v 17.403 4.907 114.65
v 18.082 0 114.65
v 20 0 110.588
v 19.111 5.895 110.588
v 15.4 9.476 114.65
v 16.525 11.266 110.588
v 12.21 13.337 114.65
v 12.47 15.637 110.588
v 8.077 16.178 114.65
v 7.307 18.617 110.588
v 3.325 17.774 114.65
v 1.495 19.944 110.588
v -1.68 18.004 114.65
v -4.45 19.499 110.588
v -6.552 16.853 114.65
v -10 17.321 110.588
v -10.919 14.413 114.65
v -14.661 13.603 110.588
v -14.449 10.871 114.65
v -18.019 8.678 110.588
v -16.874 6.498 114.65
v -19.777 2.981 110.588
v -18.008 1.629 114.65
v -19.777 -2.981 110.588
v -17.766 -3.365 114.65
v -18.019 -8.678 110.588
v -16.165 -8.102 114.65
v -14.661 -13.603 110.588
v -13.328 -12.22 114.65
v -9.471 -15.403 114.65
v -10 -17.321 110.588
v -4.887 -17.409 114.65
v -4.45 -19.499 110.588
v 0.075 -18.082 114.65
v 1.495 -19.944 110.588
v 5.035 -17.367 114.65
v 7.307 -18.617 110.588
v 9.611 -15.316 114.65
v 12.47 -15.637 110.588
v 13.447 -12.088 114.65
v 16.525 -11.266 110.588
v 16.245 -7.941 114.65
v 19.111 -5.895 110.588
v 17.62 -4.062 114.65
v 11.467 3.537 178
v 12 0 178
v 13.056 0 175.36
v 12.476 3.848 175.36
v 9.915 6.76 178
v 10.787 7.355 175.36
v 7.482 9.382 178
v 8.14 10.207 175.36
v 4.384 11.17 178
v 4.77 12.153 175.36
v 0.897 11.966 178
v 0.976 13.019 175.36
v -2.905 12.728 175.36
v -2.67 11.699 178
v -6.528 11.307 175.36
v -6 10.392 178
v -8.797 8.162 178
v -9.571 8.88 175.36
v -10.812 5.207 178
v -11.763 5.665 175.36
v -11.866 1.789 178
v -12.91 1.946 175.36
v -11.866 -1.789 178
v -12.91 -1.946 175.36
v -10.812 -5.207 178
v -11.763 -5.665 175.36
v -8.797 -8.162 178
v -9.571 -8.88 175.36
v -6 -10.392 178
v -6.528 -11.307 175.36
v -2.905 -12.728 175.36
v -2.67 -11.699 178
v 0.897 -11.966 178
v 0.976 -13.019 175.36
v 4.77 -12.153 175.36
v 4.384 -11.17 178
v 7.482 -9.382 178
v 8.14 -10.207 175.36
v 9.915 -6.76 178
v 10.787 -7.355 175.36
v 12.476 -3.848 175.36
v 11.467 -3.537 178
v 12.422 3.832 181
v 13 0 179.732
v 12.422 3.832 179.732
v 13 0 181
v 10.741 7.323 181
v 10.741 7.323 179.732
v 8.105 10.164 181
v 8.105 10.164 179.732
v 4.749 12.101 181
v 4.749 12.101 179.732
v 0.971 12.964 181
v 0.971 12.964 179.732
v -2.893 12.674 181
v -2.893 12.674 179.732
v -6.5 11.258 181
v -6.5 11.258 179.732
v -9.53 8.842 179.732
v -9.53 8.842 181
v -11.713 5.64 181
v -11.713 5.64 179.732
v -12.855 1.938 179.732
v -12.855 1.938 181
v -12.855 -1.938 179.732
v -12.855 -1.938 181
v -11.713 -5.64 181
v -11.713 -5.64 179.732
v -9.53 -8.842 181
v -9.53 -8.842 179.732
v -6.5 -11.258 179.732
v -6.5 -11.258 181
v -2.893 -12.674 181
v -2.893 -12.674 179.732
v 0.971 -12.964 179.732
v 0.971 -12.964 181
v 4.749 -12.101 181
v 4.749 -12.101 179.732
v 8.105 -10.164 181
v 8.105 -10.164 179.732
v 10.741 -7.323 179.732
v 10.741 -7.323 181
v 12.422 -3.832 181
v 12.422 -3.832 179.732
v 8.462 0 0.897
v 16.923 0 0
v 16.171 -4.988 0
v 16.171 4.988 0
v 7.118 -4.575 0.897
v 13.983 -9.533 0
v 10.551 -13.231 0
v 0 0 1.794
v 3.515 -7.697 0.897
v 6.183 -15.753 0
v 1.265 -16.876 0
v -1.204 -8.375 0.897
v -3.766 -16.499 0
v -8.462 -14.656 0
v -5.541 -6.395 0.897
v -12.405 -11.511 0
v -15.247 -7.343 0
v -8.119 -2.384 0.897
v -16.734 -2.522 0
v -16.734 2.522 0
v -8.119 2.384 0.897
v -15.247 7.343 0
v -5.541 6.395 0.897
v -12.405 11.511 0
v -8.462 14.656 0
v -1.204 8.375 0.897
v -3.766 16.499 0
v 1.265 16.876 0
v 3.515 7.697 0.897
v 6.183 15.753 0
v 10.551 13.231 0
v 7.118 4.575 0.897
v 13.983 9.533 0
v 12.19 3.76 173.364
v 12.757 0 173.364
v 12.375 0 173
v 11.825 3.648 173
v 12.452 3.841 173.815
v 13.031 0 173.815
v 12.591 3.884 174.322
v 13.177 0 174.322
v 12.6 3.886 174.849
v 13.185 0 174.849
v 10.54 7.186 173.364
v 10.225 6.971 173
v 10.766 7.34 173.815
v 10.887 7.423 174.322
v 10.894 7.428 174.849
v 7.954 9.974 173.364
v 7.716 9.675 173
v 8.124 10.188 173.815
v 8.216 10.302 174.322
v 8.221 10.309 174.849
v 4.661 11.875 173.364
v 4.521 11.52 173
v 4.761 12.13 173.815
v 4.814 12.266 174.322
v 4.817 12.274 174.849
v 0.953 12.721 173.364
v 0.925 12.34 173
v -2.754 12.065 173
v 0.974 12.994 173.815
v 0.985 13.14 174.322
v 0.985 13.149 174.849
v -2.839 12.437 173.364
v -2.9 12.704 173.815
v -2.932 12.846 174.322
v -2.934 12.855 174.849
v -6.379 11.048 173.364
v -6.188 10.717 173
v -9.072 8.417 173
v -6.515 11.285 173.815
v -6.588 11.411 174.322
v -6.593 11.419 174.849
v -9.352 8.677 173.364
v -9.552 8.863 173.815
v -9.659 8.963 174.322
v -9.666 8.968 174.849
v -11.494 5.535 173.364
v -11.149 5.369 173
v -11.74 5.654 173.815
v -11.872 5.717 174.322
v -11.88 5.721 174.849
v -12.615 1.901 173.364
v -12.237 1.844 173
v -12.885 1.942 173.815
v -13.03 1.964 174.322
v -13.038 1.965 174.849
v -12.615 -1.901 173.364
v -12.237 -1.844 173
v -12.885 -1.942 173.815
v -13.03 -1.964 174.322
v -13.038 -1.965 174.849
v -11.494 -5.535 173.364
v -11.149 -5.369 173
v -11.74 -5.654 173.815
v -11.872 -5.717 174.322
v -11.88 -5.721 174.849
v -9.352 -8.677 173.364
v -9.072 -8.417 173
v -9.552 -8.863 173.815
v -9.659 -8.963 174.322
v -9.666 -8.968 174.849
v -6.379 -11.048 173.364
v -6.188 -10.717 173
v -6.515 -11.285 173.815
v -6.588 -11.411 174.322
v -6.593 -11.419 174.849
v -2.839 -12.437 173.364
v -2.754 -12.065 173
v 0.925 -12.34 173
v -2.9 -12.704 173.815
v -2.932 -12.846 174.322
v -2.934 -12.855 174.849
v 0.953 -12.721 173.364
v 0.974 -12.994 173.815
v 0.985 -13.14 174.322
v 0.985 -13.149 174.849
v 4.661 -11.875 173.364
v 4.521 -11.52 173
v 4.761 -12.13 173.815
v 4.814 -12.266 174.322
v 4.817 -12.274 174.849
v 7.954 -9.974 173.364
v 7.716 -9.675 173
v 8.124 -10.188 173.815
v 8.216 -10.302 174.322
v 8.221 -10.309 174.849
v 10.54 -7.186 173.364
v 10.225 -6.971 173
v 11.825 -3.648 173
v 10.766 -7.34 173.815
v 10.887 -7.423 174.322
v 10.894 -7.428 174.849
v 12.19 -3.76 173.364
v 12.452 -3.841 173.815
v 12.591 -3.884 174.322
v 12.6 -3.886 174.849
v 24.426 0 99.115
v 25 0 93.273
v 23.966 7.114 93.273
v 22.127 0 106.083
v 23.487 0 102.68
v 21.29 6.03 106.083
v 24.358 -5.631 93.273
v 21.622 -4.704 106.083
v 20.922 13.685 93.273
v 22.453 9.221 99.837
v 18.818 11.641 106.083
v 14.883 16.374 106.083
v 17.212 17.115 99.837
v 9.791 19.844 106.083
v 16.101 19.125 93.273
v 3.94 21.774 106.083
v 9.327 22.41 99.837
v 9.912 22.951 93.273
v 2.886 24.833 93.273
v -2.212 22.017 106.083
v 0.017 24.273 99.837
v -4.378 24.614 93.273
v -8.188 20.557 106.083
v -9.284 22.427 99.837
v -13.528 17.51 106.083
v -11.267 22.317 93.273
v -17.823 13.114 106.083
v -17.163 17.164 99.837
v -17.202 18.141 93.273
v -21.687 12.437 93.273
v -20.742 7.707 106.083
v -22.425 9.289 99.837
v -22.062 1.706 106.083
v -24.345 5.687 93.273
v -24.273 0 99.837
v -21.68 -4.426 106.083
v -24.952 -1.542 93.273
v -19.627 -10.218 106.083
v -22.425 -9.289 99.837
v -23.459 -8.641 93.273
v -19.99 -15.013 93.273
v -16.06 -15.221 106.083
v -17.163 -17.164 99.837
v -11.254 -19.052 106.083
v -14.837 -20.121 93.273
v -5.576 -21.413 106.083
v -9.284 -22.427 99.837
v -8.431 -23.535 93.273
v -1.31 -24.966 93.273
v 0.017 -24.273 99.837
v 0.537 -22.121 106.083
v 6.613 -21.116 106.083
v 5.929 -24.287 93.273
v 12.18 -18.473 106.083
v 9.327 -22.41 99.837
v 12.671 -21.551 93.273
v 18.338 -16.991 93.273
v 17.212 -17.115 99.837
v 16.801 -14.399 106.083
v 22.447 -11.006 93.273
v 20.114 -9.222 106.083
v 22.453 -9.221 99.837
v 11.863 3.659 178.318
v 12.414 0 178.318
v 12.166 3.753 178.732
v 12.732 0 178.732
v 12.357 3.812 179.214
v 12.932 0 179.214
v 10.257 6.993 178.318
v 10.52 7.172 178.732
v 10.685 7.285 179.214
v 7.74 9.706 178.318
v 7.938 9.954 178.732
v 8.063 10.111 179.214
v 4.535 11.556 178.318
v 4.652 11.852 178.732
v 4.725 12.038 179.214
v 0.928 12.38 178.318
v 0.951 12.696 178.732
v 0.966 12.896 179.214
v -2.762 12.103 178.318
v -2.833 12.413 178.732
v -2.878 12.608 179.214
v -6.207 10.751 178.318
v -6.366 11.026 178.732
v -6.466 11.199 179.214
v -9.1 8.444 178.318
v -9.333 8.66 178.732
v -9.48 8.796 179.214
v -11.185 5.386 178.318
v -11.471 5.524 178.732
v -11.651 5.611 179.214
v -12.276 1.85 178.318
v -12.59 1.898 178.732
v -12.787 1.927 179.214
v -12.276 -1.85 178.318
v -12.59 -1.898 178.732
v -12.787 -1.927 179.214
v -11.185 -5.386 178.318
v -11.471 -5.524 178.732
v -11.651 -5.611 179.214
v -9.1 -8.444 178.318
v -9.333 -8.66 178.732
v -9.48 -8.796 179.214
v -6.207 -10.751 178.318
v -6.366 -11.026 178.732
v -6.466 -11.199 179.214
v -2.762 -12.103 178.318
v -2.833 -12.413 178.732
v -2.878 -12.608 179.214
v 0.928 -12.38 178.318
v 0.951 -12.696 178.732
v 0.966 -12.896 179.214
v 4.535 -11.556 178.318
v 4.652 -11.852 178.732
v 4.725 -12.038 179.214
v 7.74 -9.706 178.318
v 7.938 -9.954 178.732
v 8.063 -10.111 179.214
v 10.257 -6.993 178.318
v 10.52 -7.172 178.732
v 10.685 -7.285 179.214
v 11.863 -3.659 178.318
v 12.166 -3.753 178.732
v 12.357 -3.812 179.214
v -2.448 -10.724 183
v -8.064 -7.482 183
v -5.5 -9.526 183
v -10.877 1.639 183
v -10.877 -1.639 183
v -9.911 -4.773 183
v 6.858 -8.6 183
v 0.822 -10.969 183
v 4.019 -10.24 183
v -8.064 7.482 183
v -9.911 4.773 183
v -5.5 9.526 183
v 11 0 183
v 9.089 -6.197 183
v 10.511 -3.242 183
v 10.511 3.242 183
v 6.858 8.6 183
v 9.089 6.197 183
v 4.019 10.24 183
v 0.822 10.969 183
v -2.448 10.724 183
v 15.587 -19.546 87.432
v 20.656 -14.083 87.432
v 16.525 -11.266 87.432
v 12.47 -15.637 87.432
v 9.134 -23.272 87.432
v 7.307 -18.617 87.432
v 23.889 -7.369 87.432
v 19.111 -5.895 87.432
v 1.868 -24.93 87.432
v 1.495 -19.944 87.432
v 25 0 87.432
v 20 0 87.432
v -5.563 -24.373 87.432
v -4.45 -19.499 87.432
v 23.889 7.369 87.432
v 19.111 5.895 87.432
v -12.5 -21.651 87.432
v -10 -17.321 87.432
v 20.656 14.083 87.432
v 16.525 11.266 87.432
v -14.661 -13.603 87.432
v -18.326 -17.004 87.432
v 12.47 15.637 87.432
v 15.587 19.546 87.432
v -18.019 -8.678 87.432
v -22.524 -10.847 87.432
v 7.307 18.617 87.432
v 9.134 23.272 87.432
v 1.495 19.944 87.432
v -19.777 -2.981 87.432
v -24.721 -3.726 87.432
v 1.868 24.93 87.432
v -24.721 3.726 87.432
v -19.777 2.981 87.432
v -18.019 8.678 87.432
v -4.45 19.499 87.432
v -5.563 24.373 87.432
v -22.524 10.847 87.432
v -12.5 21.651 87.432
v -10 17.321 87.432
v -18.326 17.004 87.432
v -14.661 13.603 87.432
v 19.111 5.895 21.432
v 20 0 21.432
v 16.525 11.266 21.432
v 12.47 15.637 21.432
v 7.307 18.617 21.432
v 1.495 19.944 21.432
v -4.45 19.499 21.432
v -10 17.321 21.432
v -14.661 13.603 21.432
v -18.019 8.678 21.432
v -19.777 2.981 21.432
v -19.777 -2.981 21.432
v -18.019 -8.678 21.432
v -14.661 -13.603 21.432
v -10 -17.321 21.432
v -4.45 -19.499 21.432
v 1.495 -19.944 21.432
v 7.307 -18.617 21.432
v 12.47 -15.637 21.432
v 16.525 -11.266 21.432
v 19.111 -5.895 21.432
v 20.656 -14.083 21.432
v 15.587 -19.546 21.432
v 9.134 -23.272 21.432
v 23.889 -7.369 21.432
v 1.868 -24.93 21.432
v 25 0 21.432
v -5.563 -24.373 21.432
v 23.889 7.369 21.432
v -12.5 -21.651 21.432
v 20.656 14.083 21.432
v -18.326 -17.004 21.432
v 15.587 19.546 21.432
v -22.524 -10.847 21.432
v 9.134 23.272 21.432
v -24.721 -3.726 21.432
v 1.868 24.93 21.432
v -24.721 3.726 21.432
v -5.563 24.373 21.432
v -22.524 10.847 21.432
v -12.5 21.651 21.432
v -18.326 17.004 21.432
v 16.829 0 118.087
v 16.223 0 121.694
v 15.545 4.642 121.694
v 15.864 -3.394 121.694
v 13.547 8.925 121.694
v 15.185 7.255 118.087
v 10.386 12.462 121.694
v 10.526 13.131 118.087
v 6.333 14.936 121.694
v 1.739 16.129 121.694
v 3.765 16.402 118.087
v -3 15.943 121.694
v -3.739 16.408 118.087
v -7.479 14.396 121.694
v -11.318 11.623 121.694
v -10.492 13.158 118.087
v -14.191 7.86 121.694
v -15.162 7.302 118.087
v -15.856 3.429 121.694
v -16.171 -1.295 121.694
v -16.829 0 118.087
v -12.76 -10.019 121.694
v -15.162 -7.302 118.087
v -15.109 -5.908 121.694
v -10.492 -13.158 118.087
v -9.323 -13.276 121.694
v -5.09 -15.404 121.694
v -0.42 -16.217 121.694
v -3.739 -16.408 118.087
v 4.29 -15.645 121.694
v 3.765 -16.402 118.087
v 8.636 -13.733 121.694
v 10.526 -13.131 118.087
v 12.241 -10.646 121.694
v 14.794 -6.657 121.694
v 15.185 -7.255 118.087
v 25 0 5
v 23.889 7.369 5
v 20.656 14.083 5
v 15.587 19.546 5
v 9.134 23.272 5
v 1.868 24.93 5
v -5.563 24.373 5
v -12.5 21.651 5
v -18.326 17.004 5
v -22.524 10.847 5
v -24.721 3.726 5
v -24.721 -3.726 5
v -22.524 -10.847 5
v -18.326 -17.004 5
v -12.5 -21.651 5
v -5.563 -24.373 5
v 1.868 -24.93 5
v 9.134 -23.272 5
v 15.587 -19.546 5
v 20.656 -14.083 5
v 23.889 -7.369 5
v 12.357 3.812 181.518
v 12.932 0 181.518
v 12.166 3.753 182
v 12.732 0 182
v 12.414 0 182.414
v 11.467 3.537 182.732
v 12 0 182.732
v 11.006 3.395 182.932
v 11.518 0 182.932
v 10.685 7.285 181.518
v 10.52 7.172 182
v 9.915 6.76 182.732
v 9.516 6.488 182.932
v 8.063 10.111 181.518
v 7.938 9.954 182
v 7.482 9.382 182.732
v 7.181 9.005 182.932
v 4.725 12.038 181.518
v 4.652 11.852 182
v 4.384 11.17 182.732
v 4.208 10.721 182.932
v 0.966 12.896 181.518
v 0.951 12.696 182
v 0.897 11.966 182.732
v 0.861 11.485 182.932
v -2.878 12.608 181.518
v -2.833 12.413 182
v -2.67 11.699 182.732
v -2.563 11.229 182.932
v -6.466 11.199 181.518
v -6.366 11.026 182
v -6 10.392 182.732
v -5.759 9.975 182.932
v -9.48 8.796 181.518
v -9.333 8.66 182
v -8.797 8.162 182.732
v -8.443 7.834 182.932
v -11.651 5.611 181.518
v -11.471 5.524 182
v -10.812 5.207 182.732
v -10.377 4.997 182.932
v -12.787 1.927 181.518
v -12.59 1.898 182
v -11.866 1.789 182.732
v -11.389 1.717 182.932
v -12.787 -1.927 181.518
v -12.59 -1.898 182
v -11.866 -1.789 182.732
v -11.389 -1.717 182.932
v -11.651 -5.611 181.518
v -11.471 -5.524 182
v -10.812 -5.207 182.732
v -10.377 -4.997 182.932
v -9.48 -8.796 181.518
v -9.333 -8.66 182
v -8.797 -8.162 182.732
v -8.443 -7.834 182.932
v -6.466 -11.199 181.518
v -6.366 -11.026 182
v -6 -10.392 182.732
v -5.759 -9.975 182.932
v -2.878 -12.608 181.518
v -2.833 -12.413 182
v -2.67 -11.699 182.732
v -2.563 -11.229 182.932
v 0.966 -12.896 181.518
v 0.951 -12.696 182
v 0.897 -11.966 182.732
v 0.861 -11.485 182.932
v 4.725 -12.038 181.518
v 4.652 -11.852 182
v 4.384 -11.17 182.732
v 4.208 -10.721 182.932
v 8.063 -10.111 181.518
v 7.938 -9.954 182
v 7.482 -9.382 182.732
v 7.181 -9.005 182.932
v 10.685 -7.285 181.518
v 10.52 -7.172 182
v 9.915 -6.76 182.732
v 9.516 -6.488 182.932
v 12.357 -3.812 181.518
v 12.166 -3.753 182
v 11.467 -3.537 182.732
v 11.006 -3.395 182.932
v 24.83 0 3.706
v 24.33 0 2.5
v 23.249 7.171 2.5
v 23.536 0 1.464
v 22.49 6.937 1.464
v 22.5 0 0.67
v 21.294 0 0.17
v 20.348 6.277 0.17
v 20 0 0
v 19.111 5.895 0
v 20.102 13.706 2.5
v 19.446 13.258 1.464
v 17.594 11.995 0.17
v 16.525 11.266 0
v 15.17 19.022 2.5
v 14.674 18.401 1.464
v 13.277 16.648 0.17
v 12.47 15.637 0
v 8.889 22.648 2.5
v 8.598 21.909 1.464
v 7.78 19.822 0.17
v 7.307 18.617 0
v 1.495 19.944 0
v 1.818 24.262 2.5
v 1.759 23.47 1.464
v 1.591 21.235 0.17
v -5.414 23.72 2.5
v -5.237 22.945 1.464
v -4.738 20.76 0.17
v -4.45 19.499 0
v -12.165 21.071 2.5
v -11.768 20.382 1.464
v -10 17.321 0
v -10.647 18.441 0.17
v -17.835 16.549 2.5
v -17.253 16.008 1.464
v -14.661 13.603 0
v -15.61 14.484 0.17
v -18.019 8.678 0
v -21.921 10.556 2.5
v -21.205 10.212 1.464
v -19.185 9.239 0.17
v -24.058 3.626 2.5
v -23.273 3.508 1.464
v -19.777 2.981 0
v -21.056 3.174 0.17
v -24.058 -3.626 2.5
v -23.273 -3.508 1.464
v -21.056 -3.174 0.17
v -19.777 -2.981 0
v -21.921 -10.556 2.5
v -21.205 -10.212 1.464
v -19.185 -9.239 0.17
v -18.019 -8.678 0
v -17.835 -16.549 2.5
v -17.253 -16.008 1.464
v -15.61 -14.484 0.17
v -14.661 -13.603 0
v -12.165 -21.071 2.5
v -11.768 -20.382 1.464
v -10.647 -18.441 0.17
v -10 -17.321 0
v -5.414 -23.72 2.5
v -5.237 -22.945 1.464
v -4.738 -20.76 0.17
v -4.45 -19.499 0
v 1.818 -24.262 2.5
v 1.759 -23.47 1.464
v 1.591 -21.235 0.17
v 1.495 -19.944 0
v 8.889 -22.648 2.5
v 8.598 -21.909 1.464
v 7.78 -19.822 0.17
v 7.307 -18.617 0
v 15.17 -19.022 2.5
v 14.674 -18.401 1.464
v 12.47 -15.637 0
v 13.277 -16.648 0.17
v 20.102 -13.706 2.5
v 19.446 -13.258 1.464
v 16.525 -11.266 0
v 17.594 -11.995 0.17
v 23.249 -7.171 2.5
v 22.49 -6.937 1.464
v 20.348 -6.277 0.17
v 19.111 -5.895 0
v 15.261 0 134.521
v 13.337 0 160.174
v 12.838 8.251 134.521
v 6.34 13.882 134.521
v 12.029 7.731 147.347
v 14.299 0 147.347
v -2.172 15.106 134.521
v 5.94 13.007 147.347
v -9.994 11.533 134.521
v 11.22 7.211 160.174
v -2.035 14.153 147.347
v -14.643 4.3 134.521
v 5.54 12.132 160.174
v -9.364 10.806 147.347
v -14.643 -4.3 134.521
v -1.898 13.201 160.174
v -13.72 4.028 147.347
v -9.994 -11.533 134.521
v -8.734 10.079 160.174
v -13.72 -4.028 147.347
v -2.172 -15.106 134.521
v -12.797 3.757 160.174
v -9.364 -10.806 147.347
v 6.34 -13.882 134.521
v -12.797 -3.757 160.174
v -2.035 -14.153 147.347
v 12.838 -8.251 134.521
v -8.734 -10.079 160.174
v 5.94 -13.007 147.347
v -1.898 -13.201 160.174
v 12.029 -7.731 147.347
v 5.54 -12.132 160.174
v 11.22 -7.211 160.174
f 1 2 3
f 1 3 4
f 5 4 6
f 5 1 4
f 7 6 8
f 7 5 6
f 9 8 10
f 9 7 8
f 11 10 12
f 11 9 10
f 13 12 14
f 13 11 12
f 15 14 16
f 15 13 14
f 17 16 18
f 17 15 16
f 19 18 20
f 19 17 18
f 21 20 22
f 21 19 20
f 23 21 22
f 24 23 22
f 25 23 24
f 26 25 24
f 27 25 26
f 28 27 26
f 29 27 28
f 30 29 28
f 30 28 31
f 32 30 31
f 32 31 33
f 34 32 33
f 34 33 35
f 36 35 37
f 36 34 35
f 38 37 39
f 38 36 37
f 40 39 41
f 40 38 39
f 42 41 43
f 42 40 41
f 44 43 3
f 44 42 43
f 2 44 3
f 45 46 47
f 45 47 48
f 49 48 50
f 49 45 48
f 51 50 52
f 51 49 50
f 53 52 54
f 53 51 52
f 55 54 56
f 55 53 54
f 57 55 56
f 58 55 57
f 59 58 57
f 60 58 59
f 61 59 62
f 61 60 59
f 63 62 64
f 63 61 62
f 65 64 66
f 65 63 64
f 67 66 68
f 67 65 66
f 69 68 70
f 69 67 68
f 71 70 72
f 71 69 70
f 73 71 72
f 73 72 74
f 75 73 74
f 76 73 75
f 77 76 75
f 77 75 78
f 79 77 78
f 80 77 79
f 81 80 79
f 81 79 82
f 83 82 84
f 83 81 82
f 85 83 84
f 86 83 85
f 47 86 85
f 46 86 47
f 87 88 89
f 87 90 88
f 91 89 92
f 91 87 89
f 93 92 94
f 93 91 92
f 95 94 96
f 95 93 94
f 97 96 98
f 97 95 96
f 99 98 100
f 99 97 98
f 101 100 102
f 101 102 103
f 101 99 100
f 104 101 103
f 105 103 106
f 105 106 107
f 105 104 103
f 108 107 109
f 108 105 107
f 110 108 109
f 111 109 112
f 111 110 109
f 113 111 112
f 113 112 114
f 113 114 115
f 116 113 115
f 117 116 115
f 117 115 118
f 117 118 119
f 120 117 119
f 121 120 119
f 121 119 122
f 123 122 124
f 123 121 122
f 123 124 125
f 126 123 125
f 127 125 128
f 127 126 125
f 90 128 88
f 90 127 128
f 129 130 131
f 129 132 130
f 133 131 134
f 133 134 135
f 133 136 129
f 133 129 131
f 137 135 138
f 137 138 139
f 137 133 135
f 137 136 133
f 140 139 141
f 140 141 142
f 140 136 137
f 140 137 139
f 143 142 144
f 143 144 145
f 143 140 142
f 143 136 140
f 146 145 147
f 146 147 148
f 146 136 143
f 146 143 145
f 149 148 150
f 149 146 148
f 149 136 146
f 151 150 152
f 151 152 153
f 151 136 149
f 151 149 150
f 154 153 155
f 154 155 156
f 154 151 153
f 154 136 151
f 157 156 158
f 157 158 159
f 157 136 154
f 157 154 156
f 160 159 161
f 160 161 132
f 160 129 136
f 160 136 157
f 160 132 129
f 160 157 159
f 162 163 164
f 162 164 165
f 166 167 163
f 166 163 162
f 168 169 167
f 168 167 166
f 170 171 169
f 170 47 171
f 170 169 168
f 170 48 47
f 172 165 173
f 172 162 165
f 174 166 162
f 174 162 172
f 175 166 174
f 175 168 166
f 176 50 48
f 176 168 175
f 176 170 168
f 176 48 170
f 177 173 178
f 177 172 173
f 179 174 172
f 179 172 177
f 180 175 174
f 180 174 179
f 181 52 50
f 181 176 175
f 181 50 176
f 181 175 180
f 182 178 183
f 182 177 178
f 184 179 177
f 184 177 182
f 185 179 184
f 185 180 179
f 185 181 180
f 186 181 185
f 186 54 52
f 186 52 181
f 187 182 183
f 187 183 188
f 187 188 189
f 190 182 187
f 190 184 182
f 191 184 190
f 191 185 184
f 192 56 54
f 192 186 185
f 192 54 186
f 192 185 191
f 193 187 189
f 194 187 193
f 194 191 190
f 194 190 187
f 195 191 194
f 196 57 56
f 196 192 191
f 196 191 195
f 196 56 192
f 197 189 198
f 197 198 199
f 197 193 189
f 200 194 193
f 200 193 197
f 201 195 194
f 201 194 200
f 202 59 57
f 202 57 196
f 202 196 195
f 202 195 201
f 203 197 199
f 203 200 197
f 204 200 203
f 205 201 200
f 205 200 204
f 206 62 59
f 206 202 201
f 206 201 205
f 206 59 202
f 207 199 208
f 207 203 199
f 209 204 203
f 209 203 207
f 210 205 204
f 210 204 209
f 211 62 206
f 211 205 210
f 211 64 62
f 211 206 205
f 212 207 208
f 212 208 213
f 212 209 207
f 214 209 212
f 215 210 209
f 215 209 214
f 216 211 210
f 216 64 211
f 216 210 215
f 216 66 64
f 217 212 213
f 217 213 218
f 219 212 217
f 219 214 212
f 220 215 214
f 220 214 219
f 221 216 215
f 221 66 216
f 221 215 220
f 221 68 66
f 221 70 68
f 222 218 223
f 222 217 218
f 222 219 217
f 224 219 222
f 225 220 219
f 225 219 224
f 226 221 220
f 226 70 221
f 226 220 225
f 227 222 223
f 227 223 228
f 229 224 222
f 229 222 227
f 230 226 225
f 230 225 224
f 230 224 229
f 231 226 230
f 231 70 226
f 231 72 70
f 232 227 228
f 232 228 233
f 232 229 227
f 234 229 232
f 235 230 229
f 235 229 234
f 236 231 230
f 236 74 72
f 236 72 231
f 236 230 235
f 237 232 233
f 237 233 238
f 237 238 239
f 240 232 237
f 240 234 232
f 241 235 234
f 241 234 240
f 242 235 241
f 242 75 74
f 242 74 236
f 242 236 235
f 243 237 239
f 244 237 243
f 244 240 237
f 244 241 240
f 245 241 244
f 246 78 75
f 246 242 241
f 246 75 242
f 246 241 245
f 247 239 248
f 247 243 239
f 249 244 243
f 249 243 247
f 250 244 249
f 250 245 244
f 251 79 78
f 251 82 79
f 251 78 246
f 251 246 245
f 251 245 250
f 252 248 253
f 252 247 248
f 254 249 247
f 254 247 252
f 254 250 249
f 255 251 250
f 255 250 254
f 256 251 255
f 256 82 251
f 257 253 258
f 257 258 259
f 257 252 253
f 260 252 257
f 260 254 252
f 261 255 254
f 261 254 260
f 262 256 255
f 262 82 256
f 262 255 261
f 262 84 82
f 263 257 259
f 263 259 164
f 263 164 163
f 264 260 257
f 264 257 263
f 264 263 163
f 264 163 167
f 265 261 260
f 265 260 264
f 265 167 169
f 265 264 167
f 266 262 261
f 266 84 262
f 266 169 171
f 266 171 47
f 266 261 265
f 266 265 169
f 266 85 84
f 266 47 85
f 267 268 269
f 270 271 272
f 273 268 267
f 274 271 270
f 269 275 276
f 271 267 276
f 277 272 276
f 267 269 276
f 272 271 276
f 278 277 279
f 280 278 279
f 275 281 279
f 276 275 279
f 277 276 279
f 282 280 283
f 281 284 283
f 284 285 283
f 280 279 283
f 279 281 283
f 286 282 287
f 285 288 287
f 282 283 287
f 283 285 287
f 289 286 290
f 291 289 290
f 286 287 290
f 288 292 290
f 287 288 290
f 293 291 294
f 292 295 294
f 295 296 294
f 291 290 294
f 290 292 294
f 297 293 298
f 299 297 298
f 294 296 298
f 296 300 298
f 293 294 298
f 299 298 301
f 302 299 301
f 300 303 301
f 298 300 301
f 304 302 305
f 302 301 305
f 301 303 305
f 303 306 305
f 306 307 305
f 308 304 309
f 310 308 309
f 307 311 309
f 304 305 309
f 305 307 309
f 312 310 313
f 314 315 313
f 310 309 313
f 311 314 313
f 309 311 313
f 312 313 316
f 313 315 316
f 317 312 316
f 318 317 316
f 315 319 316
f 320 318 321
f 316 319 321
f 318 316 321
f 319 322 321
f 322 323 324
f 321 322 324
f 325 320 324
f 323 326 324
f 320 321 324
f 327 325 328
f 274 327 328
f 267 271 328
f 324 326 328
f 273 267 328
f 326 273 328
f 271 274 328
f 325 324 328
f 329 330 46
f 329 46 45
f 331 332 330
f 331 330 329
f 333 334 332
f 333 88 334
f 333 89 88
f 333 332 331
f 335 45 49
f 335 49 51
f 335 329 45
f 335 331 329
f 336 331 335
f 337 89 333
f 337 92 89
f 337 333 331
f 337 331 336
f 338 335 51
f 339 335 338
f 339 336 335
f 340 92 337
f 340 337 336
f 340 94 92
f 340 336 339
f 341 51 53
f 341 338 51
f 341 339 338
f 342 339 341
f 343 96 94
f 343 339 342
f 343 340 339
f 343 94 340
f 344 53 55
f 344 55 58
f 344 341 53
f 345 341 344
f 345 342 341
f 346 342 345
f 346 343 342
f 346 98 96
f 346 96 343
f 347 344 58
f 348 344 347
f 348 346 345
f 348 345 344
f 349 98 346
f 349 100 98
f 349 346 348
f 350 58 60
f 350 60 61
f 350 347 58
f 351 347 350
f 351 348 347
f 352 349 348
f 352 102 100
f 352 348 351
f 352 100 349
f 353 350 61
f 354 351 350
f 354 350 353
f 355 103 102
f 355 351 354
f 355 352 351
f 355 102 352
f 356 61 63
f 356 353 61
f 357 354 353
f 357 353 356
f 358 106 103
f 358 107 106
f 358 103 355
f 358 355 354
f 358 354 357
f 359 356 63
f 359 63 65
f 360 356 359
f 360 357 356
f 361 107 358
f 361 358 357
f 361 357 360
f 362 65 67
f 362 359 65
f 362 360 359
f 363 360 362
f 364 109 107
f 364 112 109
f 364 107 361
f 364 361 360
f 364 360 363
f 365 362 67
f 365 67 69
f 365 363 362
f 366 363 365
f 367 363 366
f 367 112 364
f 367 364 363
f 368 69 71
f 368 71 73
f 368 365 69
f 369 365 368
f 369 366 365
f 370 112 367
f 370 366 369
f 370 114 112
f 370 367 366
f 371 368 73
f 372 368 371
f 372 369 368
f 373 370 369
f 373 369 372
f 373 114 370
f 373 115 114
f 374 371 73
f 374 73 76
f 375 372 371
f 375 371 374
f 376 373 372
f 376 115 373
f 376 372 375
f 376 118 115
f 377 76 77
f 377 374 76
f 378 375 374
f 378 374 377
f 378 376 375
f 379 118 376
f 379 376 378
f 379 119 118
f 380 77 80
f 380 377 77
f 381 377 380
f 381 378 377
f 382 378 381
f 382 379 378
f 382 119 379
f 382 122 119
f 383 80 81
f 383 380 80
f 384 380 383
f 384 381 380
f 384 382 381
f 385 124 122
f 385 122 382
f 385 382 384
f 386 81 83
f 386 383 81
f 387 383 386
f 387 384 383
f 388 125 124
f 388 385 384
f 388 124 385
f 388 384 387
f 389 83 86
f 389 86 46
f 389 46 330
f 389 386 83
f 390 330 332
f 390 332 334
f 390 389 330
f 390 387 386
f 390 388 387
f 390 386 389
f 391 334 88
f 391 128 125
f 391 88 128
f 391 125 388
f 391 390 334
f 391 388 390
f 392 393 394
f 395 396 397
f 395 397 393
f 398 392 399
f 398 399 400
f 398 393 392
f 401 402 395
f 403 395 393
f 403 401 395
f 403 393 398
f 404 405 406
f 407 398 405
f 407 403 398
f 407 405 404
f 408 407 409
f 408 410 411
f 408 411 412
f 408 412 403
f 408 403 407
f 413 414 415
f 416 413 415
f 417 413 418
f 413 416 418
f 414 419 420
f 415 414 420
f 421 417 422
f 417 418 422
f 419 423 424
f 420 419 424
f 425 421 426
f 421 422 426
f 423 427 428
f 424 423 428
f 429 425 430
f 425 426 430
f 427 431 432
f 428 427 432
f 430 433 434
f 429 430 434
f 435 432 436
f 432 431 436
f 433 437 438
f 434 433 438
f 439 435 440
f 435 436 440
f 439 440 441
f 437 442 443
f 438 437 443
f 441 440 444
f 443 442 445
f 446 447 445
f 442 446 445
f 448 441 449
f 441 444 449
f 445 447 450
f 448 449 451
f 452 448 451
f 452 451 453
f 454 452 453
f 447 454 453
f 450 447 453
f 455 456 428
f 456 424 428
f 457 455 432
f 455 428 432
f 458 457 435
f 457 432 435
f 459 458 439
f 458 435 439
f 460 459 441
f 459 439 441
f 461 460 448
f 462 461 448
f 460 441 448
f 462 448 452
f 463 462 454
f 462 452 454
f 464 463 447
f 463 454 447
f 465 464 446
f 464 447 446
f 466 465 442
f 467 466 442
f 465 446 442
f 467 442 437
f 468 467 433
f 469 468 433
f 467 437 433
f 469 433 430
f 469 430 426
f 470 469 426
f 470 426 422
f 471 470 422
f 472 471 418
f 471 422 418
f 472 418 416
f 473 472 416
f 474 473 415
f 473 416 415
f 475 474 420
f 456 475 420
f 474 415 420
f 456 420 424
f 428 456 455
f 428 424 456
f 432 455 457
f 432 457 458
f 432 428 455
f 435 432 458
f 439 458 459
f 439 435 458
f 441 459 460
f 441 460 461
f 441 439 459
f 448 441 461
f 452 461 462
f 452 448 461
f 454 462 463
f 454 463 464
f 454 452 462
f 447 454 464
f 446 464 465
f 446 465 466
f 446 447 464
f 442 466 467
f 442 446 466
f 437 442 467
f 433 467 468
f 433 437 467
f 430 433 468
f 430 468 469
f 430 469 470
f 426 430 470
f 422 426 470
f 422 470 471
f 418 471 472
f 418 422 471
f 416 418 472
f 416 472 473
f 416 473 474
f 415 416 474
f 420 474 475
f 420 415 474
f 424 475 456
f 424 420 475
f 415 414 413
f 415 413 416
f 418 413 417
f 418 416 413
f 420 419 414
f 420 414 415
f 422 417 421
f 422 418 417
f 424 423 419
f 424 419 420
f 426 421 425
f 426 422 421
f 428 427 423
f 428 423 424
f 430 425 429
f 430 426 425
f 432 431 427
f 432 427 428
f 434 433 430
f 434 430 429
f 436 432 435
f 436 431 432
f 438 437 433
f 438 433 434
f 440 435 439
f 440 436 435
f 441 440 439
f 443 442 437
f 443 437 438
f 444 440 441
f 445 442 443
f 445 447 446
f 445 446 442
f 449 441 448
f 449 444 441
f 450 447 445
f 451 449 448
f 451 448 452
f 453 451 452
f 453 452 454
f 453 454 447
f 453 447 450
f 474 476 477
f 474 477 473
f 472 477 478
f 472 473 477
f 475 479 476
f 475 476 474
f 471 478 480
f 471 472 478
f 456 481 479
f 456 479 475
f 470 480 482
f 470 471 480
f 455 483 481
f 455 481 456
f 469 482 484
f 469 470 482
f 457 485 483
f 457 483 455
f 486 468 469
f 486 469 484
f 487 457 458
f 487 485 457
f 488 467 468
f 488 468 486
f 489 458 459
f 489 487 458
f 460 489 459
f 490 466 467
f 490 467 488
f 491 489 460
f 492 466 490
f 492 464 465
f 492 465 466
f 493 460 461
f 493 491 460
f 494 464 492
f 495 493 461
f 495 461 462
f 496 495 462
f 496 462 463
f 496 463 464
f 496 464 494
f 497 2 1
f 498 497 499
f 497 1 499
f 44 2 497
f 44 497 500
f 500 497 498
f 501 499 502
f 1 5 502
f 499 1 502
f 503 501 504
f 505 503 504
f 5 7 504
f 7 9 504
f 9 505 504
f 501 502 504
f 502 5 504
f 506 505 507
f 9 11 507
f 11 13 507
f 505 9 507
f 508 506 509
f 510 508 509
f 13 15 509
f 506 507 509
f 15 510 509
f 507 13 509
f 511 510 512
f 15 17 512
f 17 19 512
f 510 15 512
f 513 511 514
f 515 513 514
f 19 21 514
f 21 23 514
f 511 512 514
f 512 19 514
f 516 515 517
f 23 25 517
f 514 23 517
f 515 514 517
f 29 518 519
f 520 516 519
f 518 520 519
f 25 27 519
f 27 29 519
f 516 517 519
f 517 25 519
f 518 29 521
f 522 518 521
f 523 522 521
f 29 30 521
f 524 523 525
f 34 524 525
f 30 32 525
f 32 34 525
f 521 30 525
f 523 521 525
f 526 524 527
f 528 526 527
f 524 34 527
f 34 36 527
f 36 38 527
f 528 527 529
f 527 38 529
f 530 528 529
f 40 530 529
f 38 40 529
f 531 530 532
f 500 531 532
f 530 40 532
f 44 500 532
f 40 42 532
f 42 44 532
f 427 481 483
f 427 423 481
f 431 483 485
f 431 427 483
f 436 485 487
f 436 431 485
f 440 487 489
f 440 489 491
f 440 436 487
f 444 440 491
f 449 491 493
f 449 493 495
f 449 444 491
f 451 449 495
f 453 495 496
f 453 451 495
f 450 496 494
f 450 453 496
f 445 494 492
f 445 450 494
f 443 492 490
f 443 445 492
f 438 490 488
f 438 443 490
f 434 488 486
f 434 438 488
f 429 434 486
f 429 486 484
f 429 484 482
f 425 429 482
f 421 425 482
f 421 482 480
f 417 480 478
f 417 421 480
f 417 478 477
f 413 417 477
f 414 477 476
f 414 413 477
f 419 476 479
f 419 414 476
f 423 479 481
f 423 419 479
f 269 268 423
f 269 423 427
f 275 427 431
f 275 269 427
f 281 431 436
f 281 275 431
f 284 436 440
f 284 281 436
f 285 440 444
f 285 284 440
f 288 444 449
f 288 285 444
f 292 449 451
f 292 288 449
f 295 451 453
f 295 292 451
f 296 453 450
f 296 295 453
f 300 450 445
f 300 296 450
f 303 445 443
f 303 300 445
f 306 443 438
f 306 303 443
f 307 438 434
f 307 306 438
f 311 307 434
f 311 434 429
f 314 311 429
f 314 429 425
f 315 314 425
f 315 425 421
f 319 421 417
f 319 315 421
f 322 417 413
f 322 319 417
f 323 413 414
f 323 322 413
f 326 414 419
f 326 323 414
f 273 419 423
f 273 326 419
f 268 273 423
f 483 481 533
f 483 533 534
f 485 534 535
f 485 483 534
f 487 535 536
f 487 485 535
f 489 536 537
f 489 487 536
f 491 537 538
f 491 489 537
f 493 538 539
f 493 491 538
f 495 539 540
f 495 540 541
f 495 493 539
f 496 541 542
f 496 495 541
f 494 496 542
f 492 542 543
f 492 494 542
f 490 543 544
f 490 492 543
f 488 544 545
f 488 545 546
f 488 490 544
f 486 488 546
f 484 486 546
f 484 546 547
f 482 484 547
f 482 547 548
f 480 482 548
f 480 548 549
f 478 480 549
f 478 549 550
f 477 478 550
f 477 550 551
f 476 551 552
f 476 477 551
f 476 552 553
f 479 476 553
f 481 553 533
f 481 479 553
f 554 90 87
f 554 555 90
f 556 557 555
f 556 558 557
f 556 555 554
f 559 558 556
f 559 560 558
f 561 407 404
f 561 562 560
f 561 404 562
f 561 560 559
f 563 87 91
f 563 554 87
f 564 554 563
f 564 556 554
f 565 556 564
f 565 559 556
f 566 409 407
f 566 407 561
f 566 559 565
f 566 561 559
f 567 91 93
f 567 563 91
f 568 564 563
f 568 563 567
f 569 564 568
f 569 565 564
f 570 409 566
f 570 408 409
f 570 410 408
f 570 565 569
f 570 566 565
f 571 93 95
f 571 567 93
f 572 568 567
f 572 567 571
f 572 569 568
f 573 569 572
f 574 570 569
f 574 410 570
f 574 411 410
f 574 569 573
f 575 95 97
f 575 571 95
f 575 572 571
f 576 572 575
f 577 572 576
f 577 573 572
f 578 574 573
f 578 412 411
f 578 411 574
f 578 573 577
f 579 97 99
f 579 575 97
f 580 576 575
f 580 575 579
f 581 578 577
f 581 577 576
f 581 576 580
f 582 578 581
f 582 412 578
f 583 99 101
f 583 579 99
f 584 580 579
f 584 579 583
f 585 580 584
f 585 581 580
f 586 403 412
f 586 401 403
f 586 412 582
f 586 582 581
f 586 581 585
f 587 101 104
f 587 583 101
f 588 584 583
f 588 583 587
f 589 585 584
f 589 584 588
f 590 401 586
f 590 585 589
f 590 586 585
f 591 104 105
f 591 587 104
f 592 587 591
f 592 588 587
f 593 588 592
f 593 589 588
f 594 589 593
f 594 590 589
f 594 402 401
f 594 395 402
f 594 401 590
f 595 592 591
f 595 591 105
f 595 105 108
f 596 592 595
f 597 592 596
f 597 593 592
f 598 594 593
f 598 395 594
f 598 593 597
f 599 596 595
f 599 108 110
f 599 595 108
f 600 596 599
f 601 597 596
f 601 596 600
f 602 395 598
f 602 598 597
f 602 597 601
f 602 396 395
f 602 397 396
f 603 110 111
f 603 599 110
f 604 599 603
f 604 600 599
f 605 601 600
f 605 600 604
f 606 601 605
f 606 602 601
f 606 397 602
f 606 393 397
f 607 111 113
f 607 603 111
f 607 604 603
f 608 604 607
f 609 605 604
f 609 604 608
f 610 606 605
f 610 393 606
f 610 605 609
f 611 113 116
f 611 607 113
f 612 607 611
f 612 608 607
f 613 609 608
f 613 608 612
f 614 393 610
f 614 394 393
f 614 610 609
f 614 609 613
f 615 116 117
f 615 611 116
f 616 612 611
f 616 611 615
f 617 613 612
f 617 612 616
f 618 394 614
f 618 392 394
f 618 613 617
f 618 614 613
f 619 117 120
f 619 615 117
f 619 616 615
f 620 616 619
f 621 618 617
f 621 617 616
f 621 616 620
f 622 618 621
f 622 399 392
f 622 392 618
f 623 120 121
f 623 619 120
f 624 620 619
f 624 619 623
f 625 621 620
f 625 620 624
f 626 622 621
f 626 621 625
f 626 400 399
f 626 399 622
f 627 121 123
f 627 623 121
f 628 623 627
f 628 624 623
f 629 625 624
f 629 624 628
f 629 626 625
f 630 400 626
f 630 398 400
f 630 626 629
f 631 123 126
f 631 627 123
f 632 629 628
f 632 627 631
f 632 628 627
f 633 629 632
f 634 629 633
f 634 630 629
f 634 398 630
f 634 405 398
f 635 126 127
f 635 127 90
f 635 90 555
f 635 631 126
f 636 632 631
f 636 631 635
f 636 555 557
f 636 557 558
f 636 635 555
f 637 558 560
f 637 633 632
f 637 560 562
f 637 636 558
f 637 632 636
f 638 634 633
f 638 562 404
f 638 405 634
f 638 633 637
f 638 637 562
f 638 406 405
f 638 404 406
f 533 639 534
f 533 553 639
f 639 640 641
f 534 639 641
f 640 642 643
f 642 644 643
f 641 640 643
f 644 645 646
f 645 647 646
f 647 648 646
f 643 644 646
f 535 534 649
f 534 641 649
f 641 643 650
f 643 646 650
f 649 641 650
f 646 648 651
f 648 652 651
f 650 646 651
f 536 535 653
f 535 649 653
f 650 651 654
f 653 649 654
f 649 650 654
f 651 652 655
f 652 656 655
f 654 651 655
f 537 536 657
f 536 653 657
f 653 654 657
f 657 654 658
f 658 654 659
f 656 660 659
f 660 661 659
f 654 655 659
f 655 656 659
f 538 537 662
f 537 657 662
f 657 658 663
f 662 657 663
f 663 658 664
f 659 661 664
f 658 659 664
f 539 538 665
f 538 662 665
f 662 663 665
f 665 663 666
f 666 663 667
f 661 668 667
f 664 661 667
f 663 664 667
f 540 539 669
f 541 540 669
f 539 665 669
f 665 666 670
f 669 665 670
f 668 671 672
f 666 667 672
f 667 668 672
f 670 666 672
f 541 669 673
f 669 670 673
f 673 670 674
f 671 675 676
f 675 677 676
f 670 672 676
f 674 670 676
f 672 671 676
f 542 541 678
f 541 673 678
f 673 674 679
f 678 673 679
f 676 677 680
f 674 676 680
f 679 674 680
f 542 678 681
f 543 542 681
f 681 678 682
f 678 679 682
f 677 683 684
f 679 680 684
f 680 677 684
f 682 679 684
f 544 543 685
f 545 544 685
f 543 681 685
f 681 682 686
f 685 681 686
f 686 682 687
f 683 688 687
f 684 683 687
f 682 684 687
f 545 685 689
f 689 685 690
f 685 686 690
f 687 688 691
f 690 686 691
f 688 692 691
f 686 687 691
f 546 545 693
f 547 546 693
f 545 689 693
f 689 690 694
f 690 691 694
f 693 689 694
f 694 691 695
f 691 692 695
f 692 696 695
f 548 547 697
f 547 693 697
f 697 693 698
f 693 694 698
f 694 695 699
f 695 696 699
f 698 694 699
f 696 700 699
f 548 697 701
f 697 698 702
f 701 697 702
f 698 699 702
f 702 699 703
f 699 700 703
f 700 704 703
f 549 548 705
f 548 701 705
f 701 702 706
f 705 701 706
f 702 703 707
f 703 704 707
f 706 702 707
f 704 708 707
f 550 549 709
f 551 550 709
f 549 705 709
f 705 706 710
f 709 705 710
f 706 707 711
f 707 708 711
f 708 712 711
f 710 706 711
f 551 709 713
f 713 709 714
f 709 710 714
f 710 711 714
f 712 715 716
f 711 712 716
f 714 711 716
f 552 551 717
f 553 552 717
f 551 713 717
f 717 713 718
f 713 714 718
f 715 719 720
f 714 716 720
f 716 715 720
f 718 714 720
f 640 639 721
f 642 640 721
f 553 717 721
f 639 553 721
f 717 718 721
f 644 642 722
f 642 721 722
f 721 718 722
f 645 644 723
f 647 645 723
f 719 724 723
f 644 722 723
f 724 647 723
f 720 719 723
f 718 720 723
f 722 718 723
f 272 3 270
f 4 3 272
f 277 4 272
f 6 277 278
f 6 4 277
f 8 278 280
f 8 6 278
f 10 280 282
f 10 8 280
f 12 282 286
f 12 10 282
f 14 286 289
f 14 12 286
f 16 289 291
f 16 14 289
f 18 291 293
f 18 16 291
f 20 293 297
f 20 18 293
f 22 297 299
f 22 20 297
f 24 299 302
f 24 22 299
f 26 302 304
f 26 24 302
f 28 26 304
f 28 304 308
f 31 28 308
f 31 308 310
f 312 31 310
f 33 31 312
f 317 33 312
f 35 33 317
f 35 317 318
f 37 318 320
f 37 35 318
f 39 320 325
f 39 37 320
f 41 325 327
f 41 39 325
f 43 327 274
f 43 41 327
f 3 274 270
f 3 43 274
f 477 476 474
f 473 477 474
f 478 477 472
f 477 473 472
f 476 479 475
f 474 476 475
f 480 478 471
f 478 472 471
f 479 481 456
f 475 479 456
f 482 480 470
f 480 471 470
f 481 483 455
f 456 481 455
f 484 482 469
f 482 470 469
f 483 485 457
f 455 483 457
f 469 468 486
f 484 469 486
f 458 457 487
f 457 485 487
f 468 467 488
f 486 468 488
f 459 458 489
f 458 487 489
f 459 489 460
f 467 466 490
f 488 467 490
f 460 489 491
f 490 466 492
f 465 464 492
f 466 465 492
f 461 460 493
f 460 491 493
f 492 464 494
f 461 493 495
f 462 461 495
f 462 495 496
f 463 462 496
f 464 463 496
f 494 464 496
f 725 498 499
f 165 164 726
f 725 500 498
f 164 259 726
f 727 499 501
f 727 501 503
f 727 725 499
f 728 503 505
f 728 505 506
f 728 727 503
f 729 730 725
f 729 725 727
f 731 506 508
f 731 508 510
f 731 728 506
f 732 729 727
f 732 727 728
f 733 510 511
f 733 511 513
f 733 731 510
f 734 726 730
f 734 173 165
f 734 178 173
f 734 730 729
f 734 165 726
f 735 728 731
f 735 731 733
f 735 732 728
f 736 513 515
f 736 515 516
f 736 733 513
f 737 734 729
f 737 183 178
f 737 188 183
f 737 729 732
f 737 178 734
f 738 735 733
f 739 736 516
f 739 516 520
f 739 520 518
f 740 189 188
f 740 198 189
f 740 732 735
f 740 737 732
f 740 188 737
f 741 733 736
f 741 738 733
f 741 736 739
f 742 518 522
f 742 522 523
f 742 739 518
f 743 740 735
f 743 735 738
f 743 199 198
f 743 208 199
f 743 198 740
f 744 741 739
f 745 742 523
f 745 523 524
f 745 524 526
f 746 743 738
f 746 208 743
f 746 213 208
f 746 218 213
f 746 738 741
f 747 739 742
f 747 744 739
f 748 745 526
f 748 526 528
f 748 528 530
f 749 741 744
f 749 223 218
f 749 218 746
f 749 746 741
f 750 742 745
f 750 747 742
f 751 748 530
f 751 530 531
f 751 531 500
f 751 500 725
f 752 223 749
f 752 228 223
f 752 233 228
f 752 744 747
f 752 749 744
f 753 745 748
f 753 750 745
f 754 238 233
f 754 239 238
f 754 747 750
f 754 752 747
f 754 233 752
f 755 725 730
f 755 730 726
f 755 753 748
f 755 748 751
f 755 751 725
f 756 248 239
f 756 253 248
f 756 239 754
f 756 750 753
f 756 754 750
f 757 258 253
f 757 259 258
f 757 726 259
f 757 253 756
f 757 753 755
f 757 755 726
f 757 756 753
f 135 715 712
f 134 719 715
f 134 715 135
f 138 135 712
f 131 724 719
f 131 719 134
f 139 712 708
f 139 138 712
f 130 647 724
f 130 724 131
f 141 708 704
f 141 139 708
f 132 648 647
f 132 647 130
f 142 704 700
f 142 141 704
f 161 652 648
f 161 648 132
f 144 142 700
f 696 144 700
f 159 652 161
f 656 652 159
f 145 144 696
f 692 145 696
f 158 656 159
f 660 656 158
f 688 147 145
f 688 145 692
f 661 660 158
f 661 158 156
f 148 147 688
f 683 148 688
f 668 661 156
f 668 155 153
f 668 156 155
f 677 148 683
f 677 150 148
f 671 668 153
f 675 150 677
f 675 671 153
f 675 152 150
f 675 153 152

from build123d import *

# Parameters (mm, degrees)
F0_W   = 5
F0_H   = 21.4323662221
F0_W_2 = 12
F0_H_2 = 55
F0_H_3 = 5
F0_H_4 = 12.5676337779
F3_R   = 30
F4_R   = 20
F5_R   = 5
F0_H_5 = 66


# Not quite as in the source:
# - a fillet or chamfer that OpenCascade refuses, or shapes differently, is made with other operations: its cross-section is extruded or revolved along the edge and cut away or added


with BuildPart() as f1:
    # F0 (on Front) → F1 (revolve)
    with BuildSketch(Plane.XZ):
        with Locations((22.5, 10.7161831111)):
            Rectangle(F0_W, F0_H)
        Polygon((0, 118), (0, 0), (20, 0), (20, 21.4323662221), (20, 87.4323662221), (20, 100), (20, 110.5882352941), (16.5, 118), (12, 118), align=None)
        Polygon((20, 110.5882352941), (20, 100), (25, 100), align=None)
        Polygon((12, 173), (12, 118), (16.5, 118), (12.375, 173), align=None)
        with Locations((6, 145.5)):
            Rectangle(F0_W_2, F0_H_2)
        with Locations((6, 175.5)):
            Rectangle(F0_W_2, F0_H_3)
        Polygon((12, 178), (12, 173), (12.375, 173), align=None)
        Polygon((12, 178), (12.375, 173), (14, 173), align=None)
        Polygon((0, 183), (0, 178), (12, 178), (13, 178), (13, 183), align=None)
        with Locations((22.5, 93.7161831111)):
            Rectangle(F0_W, F0_H_4)
    revolve(axis=Axis((0, 0, 148), (0, 0, 1)))

    # F2: fillet of radius 2 on 3 edges, made by hand

    # F2_s1 → F2_t2 (revolve, cut)
    with BuildSketch(Plane.XZ):
        with BuildLine():
            ThreePointArc((13, 181), (12.4142135624, 182.4142135624), (11, 183))
            Line((11, 183), (11, 183.04))
            Line((11, 183.04), (13.04, 183.04))
            Line((13.04, 183.04), (13.04, 181))
            Line((13.04, 181), (13, 181))
        make_face()
    revolve(axis=Axis((0, 0, 183), (0, 0, 1)), mode=Mode.SUBTRACT)

    # F2_s3 → F2_t4 (revolve, cut)
    with BuildSketch(Plane.XZ):
        with BuildLine():
            ThreePointArc((12.375, 173), (13.1205394366, 174.0633553036), (13.055833561, 175.3604160974))
            Line((13.055833561, 175.3604160974), (13.0929726287, 175.3752717245))
            Line((13.0929726287, 175.3752717245), (14.0371390676, 173.0148556271))
            Line((14.0371390676, 173.0148556271), (14, 172.96))
            ThreePointArc((14, 172.96), (13.1875, 172.96), (12.3985223964, 172.9676473051))
            Line((12.3985223964, 172.9676473051), (12.375, 173))
        make_face()
    revolve(axis=Axis((0, 0, 173), (0, 0, 1)), mode=Mode.SUBTRACT)

    # F2_s5 → F2_t6 (revolve, cut)
    with BuildSketch(Plane.XZ):
        with BuildLine():
            ThreePointArc((12, 178), (12.7320508076, 178.7320508076), (13, 179.7320508076))
            Line((13, 179.7320508076), (13.04, 179.7320508076))
            Line((13.04, 179.7320508076), (13.04, 178))
            Line((13.04, 178), (13, 177.96))
            ThreePointArc((13, 177.96), (12.5, 177.96), (12.02, 177.9653589838))
            Line((12.02, 177.9653589838), (12, 178))
        make_face()
    revolve(axis=Axis((0, 0, 178), (0, 0, 1)), mode=Mode.SUBTRACT)

    # F3
    f3_edges = [f1.edges().sort_by_distance(p)[0] for p in [
        (-25, 0, 100),
    ]]
    fillet(f3_edges, radius=F3_R)

    # F4
    f4_edges = [f1.edges().sort_by_distance(p)[0] for p in [
        (-16.5, 0, 118),
    ]]
    fillet(f4_edges, radius=F4_R)

    # F5
    f5_edges = [f1.edges().sort_by_distance(p)[0] for p in [
        (-25, 0, 0),
    ]]
    fillet(f5_edges, radius=F5_R)

    # F6 (on Front) → F7 (revolve, cut)
    with BuildSketch(Plane.XZ):
        Polygon((0, 1.7939497484), (0, 0), (16.9230774045, 0), align=None)
    revolve(axis=Axis((0, 0, 0.8969748742), (0, 0, -1)), mode=Mode.SUBTRACT)


with BuildPart() as f8:
    # F0 (on Front) → F8 (revolve)
    with BuildSketch(Plane.XZ):
        with Locations((22.5, 54.4323662221)):
            Rectangle(F0_W, F0_H_5)
    revolve(axis=Axis((0, 0, 59), (0, 0, 1)))


solid = Compound([f1.part, f8.part])
